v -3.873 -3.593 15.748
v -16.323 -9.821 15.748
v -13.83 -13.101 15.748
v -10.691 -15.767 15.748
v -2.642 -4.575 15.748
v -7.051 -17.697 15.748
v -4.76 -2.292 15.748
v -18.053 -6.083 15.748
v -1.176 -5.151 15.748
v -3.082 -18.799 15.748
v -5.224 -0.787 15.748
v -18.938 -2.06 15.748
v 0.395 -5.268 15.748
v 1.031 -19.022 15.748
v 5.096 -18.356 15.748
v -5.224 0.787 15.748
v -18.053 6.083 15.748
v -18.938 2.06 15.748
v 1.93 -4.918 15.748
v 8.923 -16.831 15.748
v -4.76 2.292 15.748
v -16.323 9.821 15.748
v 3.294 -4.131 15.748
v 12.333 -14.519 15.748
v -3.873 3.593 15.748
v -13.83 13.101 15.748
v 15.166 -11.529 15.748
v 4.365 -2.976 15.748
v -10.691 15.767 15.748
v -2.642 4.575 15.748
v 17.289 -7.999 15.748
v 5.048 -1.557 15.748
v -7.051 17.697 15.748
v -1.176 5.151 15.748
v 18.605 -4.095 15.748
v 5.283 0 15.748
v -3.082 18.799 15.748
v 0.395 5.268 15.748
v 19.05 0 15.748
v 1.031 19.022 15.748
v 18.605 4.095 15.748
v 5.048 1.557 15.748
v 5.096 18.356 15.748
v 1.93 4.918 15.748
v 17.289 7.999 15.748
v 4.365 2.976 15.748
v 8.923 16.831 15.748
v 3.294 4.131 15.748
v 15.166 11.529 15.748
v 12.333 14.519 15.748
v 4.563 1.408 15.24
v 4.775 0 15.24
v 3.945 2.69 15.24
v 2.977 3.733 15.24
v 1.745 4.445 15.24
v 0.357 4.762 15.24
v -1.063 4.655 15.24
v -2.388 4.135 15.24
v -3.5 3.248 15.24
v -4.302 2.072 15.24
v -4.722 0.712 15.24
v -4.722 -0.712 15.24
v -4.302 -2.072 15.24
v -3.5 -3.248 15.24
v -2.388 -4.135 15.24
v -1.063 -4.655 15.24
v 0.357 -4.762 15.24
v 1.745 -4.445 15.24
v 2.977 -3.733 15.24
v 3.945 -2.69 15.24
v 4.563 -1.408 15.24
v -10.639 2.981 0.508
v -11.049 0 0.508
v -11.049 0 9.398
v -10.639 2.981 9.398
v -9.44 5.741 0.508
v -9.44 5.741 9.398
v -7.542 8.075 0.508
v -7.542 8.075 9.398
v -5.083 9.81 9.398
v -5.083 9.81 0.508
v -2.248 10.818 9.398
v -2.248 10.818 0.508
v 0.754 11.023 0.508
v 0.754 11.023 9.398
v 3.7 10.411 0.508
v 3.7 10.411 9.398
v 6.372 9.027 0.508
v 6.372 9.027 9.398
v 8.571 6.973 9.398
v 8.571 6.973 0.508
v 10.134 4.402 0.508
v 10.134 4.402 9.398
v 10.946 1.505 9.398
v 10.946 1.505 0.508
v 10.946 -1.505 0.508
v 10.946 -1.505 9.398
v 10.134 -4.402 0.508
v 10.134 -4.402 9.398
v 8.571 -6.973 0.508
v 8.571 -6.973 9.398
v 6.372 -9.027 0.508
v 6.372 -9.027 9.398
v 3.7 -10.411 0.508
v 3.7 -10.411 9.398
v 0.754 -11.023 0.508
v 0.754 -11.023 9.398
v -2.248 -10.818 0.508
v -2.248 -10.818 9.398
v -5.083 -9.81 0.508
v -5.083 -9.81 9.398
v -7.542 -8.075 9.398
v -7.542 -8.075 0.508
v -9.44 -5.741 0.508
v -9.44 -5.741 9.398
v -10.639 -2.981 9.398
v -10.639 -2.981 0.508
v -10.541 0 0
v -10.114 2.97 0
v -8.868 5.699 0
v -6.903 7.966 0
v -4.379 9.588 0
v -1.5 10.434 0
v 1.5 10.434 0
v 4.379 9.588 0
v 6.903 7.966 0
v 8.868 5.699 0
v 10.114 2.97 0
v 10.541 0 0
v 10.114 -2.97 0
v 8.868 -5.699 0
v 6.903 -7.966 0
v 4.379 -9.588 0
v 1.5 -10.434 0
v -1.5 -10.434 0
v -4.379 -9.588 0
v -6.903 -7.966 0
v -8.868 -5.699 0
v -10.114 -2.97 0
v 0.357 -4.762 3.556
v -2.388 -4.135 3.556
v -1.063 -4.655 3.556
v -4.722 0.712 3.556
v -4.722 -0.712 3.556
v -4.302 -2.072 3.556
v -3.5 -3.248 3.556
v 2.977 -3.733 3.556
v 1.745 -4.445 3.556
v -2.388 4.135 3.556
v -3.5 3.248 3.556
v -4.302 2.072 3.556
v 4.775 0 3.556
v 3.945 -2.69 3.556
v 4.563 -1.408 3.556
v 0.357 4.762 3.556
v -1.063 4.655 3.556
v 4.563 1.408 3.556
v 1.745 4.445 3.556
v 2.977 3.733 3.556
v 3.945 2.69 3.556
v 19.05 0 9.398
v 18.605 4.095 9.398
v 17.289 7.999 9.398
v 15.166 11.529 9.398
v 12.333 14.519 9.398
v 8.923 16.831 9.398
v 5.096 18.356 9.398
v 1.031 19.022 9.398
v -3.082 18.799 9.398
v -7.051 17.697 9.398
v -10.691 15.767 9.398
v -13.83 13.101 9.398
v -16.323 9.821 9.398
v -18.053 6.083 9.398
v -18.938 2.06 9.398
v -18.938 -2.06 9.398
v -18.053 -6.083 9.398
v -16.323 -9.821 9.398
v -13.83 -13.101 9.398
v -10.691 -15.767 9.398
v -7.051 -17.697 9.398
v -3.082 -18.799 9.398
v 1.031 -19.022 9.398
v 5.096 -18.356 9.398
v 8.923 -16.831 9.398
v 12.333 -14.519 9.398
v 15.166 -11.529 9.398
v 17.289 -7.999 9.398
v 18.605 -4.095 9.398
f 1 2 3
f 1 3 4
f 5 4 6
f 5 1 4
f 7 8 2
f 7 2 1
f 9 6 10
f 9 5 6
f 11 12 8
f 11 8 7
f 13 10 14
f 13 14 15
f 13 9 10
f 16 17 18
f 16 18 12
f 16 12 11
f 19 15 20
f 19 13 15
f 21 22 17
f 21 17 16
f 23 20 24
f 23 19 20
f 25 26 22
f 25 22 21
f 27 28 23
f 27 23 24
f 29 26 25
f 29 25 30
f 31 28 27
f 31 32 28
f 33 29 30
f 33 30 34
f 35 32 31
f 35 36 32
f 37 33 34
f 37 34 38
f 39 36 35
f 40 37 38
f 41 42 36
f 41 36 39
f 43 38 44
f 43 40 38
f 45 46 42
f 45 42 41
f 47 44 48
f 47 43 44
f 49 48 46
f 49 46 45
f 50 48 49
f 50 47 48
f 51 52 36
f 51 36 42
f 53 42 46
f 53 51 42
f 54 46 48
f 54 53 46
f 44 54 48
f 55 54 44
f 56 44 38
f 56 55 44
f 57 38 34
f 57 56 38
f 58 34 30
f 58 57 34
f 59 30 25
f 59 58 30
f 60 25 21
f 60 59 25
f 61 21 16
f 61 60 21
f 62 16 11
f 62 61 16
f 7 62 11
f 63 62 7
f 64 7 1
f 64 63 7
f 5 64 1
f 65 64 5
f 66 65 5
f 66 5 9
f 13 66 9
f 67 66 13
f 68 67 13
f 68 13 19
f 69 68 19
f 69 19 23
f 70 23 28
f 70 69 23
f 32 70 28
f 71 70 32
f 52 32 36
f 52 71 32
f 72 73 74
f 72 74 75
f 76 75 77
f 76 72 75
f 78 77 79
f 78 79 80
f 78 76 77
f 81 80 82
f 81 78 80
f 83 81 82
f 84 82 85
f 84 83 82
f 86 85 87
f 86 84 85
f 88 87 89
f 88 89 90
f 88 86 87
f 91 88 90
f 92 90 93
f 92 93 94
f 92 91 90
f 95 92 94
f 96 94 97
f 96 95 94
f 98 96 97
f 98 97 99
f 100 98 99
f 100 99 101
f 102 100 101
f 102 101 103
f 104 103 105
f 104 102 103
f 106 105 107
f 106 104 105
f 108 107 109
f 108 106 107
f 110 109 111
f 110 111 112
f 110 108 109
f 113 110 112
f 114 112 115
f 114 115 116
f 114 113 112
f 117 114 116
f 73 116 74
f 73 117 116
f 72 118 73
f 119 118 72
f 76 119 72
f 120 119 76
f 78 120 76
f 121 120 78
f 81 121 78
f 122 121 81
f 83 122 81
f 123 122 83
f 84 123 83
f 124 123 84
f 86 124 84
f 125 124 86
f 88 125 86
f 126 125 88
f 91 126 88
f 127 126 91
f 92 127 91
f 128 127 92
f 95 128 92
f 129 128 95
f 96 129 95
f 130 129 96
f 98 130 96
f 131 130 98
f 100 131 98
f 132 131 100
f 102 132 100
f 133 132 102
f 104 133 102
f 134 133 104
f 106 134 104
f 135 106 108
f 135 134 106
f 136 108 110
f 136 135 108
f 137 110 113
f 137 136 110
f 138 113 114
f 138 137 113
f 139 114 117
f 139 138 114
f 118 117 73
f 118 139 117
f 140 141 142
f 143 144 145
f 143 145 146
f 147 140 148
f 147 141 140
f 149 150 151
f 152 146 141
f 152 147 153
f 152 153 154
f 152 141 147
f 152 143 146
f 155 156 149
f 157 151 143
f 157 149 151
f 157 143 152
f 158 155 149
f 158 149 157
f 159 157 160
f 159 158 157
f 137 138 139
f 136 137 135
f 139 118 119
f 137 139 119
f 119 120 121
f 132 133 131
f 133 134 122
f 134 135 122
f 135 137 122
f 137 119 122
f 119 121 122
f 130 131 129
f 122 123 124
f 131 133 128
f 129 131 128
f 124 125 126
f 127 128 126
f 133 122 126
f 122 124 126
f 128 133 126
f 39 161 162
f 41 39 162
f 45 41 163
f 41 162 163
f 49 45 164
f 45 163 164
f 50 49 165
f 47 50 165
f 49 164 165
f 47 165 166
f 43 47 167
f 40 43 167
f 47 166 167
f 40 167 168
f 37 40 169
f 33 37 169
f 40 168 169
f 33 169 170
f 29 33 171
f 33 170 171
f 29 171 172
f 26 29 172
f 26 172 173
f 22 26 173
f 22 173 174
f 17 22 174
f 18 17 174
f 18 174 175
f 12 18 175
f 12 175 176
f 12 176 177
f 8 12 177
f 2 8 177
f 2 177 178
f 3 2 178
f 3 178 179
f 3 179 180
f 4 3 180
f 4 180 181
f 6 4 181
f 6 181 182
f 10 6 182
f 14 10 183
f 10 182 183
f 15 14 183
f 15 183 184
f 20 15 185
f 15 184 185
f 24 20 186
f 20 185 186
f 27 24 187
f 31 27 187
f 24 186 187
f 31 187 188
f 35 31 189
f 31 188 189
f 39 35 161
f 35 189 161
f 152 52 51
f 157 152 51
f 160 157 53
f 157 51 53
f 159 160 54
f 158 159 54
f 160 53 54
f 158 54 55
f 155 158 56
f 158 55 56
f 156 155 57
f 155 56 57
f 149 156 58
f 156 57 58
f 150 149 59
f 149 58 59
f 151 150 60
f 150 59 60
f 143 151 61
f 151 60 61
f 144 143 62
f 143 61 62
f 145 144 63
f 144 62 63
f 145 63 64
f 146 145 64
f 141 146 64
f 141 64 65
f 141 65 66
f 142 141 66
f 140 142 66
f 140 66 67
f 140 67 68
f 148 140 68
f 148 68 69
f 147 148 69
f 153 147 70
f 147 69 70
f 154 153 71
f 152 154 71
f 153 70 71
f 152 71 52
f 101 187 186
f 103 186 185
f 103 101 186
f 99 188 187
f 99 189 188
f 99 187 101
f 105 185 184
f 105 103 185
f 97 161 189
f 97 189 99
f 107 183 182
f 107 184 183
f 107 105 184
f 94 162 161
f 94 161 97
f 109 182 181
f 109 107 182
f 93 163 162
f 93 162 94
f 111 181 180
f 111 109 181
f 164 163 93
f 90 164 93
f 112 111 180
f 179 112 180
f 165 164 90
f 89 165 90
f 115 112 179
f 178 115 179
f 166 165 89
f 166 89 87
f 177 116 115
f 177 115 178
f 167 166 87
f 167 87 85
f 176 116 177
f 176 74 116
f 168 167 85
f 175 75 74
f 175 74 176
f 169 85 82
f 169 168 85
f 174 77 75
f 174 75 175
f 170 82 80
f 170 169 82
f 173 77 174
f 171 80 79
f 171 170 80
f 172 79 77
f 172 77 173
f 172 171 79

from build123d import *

# Parameters (mm, degrees)
SKETCH1_R          = 19.05
EXTRUDE1_DEPTH     = 15.748
SKETCH2_R          = 19.05
SKETCH2_R_2        = 11.049
CUT_EXTRUDE1_DEPTH = 9.398
SKETCH3_R          = 4.7752
CUT_EXTRUDE2_DEPTH = 12.192
CHAMFER1_SIZE      = 0.508


with BuildPart() as part:
    # Sketch1 → Extrude1 (new body)
    with BuildSketch(Plane.XY):
        Circle(SKETCH1_R)
    extrude(amount=EXTRUDE1_DEPTH)

    # Sketch2 → Cut-Extrude1 (cut)
    with BuildSketch(Plane(origin=(0, 0, 0), x_dir=(-1, 0, 0), z_dir=(0, 0, -1))):
        Circle(SKETCH2_R)
        Circle(SKETCH2_R_2, mode=Mode.SUBTRACT)
    extrude(amount=-CUT_EXTRUDE1_DEPTH, mode=Mode.SUBTRACT)

    # Sketch3 → Cut-Extrude2 (cut)
    with BuildSketch(Plane.XY.offset(15.748)):
        Circle(SKETCH3_R)
    extrude(amount=-CUT_EXTRUDE2_DEPTH, mode=Mode.SUBTRACT)

    # Chamfer1
    chamfer1_edges = [part.edges().sort_by_distance(p)[0] for p in [
        (-4.7752, 0, 15.748),
        (11.049, 0, 0),
    ]]
    chamfer(chamfer1_edges, length=CHAMFER1_SIZE)


solid = part.part
